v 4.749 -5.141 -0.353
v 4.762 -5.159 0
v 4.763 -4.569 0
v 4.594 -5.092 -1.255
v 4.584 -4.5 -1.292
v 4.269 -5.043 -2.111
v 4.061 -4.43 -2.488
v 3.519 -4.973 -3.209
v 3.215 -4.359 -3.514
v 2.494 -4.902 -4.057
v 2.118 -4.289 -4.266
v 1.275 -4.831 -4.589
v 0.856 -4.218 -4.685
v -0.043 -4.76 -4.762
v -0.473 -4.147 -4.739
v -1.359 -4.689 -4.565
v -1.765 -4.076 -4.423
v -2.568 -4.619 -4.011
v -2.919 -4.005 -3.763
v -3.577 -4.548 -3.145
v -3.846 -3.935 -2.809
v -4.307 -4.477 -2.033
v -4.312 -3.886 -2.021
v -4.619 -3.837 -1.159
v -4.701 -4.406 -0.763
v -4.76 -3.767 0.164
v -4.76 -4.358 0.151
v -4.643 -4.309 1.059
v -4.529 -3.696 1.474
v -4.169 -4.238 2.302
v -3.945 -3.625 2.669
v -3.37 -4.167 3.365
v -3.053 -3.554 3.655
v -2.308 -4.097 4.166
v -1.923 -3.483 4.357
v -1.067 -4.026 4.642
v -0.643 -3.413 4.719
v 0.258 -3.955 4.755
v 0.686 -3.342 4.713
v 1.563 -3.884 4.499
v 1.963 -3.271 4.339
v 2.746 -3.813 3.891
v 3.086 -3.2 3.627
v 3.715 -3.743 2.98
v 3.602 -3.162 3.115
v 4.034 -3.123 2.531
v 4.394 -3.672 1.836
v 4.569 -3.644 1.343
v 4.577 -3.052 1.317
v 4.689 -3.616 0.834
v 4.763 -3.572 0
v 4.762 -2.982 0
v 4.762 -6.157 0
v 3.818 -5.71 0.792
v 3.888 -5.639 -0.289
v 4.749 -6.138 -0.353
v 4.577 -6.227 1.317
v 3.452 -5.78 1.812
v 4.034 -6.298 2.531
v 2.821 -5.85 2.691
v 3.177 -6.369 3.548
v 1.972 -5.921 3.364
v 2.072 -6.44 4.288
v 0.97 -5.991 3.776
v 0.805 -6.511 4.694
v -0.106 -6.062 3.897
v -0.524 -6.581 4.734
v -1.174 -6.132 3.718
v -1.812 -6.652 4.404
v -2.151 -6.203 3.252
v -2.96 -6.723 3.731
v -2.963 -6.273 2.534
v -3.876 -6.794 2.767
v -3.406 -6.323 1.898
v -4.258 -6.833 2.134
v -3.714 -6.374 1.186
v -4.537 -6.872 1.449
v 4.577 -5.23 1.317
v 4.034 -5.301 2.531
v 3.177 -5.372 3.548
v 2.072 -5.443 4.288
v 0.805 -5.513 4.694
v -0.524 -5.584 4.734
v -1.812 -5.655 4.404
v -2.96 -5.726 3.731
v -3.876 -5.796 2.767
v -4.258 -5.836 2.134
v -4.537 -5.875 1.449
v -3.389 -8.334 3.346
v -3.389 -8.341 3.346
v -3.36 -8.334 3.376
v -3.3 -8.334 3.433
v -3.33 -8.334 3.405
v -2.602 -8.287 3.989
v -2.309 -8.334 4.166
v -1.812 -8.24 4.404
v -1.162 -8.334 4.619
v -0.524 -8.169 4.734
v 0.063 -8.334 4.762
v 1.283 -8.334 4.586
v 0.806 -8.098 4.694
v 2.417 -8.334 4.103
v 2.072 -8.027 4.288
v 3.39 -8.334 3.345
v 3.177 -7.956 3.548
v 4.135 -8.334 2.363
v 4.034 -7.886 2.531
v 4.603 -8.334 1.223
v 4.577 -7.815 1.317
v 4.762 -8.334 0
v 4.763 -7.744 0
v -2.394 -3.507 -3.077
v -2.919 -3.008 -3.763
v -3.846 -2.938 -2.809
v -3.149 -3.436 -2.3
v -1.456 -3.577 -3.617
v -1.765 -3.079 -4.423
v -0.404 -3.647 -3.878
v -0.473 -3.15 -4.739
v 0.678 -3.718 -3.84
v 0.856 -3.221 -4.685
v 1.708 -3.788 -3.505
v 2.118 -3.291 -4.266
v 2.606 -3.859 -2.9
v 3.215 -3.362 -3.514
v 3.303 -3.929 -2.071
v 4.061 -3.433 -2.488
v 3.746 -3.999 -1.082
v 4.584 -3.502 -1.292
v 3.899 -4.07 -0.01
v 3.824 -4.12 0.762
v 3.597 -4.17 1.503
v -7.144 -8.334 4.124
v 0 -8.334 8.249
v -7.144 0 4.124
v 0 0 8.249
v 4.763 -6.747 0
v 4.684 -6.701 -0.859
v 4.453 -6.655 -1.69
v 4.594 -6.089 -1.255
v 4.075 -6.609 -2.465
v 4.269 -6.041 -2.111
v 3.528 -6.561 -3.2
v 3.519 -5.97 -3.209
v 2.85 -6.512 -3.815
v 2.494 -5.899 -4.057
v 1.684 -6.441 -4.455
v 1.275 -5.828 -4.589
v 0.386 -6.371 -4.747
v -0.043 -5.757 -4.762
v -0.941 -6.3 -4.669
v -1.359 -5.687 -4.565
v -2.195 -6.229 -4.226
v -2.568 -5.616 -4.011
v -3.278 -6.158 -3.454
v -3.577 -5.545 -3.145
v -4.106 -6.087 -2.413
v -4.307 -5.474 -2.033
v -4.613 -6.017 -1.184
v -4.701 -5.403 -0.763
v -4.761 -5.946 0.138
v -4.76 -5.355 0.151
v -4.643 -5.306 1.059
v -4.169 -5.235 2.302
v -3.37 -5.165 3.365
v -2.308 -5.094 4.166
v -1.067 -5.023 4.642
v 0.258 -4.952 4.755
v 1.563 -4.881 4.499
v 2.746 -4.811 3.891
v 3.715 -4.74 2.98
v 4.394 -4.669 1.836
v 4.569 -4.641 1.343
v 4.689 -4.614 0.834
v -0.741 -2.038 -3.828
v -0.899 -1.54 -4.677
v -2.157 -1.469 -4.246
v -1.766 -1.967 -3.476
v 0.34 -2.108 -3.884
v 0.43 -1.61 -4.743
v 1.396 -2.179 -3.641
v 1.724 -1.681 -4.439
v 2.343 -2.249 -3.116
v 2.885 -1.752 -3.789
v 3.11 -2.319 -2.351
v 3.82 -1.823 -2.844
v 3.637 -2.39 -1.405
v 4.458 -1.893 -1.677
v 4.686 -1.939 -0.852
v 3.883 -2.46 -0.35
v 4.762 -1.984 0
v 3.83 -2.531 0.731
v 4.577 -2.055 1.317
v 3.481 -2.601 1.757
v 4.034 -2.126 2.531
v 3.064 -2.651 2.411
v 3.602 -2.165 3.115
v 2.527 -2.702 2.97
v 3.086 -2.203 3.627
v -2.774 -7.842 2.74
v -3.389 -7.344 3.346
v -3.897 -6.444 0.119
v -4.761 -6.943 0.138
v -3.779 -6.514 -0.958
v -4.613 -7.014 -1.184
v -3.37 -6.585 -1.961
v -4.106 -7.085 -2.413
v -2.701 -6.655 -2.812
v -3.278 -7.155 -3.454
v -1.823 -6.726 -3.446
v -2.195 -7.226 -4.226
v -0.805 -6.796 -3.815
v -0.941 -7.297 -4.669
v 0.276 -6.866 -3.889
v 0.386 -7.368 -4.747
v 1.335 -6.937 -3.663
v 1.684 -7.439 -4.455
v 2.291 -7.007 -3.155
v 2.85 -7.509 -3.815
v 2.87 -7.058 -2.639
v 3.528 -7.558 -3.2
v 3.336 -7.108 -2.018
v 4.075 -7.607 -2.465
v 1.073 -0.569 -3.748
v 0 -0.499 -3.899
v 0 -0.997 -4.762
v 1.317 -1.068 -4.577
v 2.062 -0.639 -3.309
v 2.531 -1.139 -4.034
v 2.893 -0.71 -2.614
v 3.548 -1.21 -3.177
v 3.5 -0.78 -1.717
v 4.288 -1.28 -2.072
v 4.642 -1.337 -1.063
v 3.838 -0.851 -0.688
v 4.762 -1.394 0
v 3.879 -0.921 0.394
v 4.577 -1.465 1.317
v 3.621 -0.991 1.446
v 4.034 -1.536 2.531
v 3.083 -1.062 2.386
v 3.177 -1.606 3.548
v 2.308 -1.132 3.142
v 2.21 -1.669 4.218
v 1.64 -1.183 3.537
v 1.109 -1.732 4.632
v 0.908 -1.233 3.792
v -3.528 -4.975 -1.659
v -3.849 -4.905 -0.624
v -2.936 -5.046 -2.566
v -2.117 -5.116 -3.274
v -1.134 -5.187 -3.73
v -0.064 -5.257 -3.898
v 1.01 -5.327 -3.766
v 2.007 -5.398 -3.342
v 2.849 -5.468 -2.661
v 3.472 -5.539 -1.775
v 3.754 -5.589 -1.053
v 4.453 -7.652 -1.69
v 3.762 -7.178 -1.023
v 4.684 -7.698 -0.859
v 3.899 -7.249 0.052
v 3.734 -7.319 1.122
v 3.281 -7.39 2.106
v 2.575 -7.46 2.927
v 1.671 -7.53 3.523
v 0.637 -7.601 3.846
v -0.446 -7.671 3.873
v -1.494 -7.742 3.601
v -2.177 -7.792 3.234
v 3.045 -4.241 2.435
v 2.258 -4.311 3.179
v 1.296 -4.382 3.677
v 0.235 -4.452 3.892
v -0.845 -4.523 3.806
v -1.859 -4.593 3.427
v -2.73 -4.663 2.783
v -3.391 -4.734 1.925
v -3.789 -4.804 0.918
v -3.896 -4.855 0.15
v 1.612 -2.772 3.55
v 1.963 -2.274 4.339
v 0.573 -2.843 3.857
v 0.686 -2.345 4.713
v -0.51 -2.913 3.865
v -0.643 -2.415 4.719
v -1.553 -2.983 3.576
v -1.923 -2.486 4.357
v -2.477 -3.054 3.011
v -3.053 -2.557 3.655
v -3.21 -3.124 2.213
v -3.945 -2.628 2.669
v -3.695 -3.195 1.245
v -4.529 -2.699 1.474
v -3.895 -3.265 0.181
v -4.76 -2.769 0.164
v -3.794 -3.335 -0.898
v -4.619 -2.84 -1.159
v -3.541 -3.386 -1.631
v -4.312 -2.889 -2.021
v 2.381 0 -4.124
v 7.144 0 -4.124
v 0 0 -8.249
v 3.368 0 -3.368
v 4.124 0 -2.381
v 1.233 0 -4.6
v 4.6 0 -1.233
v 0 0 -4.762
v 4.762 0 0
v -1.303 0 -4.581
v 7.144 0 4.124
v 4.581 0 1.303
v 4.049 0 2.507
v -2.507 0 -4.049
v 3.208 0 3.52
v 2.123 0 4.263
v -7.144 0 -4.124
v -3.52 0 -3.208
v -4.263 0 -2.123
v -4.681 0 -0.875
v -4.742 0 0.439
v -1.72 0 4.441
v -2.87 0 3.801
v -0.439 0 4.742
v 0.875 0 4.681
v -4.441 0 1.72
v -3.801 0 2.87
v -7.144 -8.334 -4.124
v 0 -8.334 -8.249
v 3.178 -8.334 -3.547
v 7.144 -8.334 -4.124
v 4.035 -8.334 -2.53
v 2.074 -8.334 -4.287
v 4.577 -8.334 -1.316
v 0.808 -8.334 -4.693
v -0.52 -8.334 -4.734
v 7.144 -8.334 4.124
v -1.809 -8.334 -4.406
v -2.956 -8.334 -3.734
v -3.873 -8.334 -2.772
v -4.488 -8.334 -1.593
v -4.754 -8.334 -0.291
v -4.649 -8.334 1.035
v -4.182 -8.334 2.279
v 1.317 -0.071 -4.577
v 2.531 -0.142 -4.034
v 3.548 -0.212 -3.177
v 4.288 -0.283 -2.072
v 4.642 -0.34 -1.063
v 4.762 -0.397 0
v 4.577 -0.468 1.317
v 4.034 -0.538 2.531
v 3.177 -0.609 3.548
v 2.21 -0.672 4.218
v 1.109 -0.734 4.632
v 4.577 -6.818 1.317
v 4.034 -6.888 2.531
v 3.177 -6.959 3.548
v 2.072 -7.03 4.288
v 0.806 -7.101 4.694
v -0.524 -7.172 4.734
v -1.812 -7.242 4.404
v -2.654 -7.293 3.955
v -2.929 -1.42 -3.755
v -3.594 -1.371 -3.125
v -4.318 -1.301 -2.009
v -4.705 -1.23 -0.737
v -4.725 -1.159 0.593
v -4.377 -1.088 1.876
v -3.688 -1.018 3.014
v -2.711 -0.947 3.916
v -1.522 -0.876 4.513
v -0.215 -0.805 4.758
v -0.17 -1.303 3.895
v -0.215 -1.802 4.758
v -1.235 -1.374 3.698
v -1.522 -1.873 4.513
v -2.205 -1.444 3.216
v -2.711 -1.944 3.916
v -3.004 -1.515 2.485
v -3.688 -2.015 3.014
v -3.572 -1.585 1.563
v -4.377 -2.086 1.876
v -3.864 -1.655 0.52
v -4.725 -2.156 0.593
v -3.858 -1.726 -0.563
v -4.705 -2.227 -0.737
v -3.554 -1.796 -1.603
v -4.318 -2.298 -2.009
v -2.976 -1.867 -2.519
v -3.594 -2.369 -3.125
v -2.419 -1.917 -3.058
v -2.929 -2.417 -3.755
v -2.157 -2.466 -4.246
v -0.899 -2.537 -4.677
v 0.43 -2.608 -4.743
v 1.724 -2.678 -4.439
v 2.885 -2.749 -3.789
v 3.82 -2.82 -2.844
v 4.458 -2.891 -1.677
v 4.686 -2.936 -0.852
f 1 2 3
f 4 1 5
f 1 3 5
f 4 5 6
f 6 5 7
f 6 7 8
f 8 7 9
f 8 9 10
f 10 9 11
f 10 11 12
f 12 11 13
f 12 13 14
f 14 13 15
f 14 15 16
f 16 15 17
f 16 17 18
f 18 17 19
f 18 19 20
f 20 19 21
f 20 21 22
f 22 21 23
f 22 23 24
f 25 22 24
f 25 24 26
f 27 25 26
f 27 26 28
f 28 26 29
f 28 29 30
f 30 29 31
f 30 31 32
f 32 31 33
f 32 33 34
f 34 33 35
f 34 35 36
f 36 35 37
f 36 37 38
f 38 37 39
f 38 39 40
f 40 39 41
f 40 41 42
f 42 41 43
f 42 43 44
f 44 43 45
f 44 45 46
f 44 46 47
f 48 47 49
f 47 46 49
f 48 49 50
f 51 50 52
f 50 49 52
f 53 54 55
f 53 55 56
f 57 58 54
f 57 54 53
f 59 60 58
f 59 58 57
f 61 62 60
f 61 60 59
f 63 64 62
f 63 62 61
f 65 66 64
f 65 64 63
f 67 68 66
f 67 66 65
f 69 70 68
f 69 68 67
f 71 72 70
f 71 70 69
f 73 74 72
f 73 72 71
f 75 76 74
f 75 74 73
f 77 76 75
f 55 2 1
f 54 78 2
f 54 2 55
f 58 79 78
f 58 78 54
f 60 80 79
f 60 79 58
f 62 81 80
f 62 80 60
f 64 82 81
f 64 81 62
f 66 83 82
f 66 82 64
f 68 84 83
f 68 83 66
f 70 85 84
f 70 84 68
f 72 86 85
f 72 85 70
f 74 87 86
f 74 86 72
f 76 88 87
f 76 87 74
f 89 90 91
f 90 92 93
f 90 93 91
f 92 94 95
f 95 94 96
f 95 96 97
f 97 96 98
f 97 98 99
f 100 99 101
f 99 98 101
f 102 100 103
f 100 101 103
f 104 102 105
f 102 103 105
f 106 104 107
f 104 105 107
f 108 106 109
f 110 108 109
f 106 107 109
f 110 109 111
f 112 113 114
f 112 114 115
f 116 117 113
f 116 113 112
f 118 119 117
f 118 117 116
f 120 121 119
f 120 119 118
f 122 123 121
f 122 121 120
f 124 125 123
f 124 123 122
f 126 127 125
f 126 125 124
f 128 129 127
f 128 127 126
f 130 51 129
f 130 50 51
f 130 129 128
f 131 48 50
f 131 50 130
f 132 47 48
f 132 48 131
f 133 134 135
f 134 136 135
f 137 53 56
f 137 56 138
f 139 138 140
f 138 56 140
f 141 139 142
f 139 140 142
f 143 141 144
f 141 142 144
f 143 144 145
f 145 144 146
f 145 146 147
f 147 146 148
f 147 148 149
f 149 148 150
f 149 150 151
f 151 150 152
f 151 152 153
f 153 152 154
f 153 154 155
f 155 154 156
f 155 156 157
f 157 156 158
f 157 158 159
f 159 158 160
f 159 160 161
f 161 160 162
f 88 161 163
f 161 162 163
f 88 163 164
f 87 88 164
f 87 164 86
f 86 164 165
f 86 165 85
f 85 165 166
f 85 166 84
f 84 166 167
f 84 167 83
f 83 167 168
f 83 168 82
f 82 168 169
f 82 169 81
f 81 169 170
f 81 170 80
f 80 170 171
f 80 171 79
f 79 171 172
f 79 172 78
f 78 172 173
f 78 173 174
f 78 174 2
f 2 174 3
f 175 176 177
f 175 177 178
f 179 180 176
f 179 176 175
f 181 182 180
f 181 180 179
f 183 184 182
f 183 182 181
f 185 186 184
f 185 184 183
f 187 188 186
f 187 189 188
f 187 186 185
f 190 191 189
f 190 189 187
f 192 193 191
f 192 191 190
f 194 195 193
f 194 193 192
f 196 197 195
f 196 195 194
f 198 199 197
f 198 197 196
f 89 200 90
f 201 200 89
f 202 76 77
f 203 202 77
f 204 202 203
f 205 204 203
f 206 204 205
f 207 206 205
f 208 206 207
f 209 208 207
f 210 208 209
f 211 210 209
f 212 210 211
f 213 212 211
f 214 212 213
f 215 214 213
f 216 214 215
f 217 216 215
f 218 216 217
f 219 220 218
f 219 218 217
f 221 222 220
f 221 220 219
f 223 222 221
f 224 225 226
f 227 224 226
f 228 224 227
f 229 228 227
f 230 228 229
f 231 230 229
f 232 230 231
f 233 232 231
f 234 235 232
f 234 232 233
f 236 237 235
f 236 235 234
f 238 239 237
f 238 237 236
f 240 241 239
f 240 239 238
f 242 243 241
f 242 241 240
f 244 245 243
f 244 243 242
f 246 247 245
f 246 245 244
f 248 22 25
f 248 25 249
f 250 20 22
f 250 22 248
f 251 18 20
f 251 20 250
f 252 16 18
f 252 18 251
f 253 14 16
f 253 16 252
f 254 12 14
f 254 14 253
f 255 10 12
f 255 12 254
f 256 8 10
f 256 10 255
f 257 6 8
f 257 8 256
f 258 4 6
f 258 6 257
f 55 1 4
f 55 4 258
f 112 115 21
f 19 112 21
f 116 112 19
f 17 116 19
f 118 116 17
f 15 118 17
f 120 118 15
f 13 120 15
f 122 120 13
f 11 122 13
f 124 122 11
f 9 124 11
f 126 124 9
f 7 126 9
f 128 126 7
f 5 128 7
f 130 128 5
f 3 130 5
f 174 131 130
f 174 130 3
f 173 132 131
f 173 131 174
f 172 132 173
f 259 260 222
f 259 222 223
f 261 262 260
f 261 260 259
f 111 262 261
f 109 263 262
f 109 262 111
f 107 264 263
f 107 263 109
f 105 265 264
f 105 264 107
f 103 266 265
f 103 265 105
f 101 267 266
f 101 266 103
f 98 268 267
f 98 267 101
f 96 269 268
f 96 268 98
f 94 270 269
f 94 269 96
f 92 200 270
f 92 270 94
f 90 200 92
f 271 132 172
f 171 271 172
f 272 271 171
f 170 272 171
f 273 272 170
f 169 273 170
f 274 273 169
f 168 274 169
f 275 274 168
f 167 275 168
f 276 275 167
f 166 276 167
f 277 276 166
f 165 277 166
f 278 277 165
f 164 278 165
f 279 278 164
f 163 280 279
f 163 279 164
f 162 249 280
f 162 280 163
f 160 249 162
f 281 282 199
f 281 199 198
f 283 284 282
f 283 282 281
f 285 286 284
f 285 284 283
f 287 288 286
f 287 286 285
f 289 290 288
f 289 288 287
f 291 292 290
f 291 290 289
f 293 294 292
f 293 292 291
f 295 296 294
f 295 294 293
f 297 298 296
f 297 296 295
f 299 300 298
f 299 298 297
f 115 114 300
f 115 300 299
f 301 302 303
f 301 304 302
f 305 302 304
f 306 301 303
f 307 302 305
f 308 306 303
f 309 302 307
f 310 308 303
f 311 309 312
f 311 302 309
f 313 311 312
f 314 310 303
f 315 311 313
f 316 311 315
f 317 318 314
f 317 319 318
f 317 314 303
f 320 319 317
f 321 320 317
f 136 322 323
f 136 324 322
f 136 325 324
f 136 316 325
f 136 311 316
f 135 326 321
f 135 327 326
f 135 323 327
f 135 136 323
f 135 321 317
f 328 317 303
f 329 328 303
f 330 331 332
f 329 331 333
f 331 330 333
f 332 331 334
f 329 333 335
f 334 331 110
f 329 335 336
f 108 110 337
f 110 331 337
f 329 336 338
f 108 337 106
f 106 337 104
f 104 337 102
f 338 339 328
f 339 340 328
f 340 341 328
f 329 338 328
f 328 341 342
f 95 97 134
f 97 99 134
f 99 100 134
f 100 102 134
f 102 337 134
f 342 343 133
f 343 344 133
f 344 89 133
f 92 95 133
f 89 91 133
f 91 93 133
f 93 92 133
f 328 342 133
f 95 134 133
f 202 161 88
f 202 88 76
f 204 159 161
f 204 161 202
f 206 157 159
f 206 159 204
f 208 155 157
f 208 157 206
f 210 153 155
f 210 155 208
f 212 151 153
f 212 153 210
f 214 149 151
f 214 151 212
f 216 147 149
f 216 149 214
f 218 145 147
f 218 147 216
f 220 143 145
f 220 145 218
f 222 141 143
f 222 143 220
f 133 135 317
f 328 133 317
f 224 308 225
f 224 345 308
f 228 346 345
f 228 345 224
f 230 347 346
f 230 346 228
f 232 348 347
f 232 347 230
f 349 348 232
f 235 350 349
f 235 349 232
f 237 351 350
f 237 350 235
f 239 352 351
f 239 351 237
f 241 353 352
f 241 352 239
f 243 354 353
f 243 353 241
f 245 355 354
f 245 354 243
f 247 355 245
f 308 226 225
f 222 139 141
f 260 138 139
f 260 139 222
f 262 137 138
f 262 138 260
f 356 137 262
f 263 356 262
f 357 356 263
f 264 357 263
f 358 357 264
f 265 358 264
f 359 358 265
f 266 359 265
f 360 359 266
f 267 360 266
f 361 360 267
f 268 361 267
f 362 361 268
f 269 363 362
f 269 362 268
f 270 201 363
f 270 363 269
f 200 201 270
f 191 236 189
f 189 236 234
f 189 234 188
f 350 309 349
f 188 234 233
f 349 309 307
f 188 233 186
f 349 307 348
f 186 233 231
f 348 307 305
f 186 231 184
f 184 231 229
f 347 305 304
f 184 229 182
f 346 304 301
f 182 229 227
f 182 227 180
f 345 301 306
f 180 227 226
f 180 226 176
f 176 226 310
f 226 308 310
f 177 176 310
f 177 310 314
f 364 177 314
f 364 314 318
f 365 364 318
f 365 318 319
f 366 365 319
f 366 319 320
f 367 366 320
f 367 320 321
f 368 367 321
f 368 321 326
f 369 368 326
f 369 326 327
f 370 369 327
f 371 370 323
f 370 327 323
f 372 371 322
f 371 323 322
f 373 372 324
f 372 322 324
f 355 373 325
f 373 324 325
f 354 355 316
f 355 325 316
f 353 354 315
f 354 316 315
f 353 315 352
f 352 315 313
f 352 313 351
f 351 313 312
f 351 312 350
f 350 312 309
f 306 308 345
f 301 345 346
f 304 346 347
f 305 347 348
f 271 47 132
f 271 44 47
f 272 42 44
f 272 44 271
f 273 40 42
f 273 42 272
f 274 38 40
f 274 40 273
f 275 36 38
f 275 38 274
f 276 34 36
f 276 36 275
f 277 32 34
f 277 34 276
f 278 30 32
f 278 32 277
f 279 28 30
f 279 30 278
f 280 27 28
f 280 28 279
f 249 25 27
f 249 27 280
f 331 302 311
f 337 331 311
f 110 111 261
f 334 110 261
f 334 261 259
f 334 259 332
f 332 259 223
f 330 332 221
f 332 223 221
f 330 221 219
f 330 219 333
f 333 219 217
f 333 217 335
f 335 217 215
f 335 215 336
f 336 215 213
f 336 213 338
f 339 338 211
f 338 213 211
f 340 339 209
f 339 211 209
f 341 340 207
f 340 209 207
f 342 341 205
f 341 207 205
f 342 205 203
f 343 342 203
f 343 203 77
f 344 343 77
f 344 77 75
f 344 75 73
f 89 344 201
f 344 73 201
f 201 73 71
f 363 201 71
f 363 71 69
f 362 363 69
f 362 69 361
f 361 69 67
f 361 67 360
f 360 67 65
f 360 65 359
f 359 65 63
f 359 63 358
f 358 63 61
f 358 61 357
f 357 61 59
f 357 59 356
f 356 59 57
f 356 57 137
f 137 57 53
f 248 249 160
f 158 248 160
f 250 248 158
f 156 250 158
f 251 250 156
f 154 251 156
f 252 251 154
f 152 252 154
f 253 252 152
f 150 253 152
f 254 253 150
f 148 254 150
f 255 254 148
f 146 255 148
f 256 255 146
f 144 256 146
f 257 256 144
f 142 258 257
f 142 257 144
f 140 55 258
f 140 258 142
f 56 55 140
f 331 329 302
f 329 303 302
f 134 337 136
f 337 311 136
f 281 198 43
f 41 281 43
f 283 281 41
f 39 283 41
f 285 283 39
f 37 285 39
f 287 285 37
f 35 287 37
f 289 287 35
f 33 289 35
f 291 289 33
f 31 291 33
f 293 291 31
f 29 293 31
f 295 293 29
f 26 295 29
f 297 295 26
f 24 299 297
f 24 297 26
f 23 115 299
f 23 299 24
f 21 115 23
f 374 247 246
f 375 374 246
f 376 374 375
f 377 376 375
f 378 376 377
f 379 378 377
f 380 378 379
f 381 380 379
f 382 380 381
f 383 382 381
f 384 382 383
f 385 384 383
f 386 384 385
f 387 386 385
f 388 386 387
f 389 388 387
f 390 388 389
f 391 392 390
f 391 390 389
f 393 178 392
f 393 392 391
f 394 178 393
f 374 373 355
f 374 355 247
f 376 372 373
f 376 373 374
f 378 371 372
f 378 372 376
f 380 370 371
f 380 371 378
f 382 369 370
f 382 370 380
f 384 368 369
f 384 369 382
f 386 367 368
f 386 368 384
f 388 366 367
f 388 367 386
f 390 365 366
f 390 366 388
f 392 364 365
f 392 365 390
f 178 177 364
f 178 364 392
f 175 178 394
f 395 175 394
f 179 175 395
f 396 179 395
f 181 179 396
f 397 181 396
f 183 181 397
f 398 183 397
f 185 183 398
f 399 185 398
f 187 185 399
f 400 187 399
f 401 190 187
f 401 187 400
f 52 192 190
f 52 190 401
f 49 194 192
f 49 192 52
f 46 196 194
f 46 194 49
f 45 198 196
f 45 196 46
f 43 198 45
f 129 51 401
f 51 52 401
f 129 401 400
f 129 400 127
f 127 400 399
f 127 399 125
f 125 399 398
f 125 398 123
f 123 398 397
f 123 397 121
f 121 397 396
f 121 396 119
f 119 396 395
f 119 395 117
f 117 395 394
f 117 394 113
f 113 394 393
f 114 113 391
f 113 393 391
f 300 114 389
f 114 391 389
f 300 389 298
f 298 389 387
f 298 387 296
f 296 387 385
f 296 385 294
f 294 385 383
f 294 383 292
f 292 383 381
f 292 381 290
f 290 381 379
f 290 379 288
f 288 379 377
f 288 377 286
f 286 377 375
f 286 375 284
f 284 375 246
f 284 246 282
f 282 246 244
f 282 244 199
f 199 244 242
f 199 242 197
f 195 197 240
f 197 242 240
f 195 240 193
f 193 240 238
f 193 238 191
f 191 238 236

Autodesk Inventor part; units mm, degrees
ref_plane "YZ Plane" through (0, 0, 0) normal (1, 0, 0) x (0, 1, 0)
ref_plane "XZ Plane" through (0, 0, 0) normal (0, 1, 0) x (-1, 0, 0)
ref_plane "XY Plane" through (0, 0, 0) normal (0, 0, 1) x (1, 0, 0)
sketch "Sketch1" plane through (0, 0, 0) normal (0, 1, 0) x (-1, 0, 0)
  line L0 (-7.1438, -4.1244) -> (-7.1438, 4.1244)
  line L1 (-7.1438, 4.1244) -> (0, 8.2489)
  line L2 (0, 8.2489) -> (7.1438, 4.1244)
  line L3 (7.1438, 4.1244) -> (7.1437, -4.1244)
  line L4 (7.1437, -4.1244) -> (0, -8.2489)
  line L5 (0, -8.2489) -> (-7.1438, -4.1244)
  point P0 (0, 0)
  point P1 (0, 0)
  dimension "d0" = 14.2875
extrude "Extrusion1" add sketch "Sketch1" against normal blind 8.3344
sketch "Sketch2" plane through (0, 0, 0) normal (0, 1, 0) x (1, 0, 0)
  circle A0 centre (0, 0) radius 4.7625
  dimension "d3" = 9.525
extrude "Extrusion2" cut sketch "Sketch2" against normal through all
sketch "Sketch3" plane through (0, 0, 0) normal (1, 0, 0) x (0, 1, 0)
  line L0 (0, -4.7625) -> (-8.3344, -4.7625) projected
  line L1 (0, 4.7625) -> (0, -4.7625) projected
  line L2 (-10.188, 0) -> (2.7876, 0) projected
  line L3 (0, -4.7625) -> (-0.4986, -3.8989)
  line L4 (-0.4986, -3.8989) -> (-0.9972, -4.7625)
  point P0 (0, 0)
  dimension "d18" = 60
  dimension "d19" = 3.8989
  dimension "d20" = 30
coil "Coil2" sketch "Sketch3" operation add axis through (0, -10, 0) along (0, -1, 0) pitch 1.5875 turns 4.626 hand right
properties part number "boltExample"
